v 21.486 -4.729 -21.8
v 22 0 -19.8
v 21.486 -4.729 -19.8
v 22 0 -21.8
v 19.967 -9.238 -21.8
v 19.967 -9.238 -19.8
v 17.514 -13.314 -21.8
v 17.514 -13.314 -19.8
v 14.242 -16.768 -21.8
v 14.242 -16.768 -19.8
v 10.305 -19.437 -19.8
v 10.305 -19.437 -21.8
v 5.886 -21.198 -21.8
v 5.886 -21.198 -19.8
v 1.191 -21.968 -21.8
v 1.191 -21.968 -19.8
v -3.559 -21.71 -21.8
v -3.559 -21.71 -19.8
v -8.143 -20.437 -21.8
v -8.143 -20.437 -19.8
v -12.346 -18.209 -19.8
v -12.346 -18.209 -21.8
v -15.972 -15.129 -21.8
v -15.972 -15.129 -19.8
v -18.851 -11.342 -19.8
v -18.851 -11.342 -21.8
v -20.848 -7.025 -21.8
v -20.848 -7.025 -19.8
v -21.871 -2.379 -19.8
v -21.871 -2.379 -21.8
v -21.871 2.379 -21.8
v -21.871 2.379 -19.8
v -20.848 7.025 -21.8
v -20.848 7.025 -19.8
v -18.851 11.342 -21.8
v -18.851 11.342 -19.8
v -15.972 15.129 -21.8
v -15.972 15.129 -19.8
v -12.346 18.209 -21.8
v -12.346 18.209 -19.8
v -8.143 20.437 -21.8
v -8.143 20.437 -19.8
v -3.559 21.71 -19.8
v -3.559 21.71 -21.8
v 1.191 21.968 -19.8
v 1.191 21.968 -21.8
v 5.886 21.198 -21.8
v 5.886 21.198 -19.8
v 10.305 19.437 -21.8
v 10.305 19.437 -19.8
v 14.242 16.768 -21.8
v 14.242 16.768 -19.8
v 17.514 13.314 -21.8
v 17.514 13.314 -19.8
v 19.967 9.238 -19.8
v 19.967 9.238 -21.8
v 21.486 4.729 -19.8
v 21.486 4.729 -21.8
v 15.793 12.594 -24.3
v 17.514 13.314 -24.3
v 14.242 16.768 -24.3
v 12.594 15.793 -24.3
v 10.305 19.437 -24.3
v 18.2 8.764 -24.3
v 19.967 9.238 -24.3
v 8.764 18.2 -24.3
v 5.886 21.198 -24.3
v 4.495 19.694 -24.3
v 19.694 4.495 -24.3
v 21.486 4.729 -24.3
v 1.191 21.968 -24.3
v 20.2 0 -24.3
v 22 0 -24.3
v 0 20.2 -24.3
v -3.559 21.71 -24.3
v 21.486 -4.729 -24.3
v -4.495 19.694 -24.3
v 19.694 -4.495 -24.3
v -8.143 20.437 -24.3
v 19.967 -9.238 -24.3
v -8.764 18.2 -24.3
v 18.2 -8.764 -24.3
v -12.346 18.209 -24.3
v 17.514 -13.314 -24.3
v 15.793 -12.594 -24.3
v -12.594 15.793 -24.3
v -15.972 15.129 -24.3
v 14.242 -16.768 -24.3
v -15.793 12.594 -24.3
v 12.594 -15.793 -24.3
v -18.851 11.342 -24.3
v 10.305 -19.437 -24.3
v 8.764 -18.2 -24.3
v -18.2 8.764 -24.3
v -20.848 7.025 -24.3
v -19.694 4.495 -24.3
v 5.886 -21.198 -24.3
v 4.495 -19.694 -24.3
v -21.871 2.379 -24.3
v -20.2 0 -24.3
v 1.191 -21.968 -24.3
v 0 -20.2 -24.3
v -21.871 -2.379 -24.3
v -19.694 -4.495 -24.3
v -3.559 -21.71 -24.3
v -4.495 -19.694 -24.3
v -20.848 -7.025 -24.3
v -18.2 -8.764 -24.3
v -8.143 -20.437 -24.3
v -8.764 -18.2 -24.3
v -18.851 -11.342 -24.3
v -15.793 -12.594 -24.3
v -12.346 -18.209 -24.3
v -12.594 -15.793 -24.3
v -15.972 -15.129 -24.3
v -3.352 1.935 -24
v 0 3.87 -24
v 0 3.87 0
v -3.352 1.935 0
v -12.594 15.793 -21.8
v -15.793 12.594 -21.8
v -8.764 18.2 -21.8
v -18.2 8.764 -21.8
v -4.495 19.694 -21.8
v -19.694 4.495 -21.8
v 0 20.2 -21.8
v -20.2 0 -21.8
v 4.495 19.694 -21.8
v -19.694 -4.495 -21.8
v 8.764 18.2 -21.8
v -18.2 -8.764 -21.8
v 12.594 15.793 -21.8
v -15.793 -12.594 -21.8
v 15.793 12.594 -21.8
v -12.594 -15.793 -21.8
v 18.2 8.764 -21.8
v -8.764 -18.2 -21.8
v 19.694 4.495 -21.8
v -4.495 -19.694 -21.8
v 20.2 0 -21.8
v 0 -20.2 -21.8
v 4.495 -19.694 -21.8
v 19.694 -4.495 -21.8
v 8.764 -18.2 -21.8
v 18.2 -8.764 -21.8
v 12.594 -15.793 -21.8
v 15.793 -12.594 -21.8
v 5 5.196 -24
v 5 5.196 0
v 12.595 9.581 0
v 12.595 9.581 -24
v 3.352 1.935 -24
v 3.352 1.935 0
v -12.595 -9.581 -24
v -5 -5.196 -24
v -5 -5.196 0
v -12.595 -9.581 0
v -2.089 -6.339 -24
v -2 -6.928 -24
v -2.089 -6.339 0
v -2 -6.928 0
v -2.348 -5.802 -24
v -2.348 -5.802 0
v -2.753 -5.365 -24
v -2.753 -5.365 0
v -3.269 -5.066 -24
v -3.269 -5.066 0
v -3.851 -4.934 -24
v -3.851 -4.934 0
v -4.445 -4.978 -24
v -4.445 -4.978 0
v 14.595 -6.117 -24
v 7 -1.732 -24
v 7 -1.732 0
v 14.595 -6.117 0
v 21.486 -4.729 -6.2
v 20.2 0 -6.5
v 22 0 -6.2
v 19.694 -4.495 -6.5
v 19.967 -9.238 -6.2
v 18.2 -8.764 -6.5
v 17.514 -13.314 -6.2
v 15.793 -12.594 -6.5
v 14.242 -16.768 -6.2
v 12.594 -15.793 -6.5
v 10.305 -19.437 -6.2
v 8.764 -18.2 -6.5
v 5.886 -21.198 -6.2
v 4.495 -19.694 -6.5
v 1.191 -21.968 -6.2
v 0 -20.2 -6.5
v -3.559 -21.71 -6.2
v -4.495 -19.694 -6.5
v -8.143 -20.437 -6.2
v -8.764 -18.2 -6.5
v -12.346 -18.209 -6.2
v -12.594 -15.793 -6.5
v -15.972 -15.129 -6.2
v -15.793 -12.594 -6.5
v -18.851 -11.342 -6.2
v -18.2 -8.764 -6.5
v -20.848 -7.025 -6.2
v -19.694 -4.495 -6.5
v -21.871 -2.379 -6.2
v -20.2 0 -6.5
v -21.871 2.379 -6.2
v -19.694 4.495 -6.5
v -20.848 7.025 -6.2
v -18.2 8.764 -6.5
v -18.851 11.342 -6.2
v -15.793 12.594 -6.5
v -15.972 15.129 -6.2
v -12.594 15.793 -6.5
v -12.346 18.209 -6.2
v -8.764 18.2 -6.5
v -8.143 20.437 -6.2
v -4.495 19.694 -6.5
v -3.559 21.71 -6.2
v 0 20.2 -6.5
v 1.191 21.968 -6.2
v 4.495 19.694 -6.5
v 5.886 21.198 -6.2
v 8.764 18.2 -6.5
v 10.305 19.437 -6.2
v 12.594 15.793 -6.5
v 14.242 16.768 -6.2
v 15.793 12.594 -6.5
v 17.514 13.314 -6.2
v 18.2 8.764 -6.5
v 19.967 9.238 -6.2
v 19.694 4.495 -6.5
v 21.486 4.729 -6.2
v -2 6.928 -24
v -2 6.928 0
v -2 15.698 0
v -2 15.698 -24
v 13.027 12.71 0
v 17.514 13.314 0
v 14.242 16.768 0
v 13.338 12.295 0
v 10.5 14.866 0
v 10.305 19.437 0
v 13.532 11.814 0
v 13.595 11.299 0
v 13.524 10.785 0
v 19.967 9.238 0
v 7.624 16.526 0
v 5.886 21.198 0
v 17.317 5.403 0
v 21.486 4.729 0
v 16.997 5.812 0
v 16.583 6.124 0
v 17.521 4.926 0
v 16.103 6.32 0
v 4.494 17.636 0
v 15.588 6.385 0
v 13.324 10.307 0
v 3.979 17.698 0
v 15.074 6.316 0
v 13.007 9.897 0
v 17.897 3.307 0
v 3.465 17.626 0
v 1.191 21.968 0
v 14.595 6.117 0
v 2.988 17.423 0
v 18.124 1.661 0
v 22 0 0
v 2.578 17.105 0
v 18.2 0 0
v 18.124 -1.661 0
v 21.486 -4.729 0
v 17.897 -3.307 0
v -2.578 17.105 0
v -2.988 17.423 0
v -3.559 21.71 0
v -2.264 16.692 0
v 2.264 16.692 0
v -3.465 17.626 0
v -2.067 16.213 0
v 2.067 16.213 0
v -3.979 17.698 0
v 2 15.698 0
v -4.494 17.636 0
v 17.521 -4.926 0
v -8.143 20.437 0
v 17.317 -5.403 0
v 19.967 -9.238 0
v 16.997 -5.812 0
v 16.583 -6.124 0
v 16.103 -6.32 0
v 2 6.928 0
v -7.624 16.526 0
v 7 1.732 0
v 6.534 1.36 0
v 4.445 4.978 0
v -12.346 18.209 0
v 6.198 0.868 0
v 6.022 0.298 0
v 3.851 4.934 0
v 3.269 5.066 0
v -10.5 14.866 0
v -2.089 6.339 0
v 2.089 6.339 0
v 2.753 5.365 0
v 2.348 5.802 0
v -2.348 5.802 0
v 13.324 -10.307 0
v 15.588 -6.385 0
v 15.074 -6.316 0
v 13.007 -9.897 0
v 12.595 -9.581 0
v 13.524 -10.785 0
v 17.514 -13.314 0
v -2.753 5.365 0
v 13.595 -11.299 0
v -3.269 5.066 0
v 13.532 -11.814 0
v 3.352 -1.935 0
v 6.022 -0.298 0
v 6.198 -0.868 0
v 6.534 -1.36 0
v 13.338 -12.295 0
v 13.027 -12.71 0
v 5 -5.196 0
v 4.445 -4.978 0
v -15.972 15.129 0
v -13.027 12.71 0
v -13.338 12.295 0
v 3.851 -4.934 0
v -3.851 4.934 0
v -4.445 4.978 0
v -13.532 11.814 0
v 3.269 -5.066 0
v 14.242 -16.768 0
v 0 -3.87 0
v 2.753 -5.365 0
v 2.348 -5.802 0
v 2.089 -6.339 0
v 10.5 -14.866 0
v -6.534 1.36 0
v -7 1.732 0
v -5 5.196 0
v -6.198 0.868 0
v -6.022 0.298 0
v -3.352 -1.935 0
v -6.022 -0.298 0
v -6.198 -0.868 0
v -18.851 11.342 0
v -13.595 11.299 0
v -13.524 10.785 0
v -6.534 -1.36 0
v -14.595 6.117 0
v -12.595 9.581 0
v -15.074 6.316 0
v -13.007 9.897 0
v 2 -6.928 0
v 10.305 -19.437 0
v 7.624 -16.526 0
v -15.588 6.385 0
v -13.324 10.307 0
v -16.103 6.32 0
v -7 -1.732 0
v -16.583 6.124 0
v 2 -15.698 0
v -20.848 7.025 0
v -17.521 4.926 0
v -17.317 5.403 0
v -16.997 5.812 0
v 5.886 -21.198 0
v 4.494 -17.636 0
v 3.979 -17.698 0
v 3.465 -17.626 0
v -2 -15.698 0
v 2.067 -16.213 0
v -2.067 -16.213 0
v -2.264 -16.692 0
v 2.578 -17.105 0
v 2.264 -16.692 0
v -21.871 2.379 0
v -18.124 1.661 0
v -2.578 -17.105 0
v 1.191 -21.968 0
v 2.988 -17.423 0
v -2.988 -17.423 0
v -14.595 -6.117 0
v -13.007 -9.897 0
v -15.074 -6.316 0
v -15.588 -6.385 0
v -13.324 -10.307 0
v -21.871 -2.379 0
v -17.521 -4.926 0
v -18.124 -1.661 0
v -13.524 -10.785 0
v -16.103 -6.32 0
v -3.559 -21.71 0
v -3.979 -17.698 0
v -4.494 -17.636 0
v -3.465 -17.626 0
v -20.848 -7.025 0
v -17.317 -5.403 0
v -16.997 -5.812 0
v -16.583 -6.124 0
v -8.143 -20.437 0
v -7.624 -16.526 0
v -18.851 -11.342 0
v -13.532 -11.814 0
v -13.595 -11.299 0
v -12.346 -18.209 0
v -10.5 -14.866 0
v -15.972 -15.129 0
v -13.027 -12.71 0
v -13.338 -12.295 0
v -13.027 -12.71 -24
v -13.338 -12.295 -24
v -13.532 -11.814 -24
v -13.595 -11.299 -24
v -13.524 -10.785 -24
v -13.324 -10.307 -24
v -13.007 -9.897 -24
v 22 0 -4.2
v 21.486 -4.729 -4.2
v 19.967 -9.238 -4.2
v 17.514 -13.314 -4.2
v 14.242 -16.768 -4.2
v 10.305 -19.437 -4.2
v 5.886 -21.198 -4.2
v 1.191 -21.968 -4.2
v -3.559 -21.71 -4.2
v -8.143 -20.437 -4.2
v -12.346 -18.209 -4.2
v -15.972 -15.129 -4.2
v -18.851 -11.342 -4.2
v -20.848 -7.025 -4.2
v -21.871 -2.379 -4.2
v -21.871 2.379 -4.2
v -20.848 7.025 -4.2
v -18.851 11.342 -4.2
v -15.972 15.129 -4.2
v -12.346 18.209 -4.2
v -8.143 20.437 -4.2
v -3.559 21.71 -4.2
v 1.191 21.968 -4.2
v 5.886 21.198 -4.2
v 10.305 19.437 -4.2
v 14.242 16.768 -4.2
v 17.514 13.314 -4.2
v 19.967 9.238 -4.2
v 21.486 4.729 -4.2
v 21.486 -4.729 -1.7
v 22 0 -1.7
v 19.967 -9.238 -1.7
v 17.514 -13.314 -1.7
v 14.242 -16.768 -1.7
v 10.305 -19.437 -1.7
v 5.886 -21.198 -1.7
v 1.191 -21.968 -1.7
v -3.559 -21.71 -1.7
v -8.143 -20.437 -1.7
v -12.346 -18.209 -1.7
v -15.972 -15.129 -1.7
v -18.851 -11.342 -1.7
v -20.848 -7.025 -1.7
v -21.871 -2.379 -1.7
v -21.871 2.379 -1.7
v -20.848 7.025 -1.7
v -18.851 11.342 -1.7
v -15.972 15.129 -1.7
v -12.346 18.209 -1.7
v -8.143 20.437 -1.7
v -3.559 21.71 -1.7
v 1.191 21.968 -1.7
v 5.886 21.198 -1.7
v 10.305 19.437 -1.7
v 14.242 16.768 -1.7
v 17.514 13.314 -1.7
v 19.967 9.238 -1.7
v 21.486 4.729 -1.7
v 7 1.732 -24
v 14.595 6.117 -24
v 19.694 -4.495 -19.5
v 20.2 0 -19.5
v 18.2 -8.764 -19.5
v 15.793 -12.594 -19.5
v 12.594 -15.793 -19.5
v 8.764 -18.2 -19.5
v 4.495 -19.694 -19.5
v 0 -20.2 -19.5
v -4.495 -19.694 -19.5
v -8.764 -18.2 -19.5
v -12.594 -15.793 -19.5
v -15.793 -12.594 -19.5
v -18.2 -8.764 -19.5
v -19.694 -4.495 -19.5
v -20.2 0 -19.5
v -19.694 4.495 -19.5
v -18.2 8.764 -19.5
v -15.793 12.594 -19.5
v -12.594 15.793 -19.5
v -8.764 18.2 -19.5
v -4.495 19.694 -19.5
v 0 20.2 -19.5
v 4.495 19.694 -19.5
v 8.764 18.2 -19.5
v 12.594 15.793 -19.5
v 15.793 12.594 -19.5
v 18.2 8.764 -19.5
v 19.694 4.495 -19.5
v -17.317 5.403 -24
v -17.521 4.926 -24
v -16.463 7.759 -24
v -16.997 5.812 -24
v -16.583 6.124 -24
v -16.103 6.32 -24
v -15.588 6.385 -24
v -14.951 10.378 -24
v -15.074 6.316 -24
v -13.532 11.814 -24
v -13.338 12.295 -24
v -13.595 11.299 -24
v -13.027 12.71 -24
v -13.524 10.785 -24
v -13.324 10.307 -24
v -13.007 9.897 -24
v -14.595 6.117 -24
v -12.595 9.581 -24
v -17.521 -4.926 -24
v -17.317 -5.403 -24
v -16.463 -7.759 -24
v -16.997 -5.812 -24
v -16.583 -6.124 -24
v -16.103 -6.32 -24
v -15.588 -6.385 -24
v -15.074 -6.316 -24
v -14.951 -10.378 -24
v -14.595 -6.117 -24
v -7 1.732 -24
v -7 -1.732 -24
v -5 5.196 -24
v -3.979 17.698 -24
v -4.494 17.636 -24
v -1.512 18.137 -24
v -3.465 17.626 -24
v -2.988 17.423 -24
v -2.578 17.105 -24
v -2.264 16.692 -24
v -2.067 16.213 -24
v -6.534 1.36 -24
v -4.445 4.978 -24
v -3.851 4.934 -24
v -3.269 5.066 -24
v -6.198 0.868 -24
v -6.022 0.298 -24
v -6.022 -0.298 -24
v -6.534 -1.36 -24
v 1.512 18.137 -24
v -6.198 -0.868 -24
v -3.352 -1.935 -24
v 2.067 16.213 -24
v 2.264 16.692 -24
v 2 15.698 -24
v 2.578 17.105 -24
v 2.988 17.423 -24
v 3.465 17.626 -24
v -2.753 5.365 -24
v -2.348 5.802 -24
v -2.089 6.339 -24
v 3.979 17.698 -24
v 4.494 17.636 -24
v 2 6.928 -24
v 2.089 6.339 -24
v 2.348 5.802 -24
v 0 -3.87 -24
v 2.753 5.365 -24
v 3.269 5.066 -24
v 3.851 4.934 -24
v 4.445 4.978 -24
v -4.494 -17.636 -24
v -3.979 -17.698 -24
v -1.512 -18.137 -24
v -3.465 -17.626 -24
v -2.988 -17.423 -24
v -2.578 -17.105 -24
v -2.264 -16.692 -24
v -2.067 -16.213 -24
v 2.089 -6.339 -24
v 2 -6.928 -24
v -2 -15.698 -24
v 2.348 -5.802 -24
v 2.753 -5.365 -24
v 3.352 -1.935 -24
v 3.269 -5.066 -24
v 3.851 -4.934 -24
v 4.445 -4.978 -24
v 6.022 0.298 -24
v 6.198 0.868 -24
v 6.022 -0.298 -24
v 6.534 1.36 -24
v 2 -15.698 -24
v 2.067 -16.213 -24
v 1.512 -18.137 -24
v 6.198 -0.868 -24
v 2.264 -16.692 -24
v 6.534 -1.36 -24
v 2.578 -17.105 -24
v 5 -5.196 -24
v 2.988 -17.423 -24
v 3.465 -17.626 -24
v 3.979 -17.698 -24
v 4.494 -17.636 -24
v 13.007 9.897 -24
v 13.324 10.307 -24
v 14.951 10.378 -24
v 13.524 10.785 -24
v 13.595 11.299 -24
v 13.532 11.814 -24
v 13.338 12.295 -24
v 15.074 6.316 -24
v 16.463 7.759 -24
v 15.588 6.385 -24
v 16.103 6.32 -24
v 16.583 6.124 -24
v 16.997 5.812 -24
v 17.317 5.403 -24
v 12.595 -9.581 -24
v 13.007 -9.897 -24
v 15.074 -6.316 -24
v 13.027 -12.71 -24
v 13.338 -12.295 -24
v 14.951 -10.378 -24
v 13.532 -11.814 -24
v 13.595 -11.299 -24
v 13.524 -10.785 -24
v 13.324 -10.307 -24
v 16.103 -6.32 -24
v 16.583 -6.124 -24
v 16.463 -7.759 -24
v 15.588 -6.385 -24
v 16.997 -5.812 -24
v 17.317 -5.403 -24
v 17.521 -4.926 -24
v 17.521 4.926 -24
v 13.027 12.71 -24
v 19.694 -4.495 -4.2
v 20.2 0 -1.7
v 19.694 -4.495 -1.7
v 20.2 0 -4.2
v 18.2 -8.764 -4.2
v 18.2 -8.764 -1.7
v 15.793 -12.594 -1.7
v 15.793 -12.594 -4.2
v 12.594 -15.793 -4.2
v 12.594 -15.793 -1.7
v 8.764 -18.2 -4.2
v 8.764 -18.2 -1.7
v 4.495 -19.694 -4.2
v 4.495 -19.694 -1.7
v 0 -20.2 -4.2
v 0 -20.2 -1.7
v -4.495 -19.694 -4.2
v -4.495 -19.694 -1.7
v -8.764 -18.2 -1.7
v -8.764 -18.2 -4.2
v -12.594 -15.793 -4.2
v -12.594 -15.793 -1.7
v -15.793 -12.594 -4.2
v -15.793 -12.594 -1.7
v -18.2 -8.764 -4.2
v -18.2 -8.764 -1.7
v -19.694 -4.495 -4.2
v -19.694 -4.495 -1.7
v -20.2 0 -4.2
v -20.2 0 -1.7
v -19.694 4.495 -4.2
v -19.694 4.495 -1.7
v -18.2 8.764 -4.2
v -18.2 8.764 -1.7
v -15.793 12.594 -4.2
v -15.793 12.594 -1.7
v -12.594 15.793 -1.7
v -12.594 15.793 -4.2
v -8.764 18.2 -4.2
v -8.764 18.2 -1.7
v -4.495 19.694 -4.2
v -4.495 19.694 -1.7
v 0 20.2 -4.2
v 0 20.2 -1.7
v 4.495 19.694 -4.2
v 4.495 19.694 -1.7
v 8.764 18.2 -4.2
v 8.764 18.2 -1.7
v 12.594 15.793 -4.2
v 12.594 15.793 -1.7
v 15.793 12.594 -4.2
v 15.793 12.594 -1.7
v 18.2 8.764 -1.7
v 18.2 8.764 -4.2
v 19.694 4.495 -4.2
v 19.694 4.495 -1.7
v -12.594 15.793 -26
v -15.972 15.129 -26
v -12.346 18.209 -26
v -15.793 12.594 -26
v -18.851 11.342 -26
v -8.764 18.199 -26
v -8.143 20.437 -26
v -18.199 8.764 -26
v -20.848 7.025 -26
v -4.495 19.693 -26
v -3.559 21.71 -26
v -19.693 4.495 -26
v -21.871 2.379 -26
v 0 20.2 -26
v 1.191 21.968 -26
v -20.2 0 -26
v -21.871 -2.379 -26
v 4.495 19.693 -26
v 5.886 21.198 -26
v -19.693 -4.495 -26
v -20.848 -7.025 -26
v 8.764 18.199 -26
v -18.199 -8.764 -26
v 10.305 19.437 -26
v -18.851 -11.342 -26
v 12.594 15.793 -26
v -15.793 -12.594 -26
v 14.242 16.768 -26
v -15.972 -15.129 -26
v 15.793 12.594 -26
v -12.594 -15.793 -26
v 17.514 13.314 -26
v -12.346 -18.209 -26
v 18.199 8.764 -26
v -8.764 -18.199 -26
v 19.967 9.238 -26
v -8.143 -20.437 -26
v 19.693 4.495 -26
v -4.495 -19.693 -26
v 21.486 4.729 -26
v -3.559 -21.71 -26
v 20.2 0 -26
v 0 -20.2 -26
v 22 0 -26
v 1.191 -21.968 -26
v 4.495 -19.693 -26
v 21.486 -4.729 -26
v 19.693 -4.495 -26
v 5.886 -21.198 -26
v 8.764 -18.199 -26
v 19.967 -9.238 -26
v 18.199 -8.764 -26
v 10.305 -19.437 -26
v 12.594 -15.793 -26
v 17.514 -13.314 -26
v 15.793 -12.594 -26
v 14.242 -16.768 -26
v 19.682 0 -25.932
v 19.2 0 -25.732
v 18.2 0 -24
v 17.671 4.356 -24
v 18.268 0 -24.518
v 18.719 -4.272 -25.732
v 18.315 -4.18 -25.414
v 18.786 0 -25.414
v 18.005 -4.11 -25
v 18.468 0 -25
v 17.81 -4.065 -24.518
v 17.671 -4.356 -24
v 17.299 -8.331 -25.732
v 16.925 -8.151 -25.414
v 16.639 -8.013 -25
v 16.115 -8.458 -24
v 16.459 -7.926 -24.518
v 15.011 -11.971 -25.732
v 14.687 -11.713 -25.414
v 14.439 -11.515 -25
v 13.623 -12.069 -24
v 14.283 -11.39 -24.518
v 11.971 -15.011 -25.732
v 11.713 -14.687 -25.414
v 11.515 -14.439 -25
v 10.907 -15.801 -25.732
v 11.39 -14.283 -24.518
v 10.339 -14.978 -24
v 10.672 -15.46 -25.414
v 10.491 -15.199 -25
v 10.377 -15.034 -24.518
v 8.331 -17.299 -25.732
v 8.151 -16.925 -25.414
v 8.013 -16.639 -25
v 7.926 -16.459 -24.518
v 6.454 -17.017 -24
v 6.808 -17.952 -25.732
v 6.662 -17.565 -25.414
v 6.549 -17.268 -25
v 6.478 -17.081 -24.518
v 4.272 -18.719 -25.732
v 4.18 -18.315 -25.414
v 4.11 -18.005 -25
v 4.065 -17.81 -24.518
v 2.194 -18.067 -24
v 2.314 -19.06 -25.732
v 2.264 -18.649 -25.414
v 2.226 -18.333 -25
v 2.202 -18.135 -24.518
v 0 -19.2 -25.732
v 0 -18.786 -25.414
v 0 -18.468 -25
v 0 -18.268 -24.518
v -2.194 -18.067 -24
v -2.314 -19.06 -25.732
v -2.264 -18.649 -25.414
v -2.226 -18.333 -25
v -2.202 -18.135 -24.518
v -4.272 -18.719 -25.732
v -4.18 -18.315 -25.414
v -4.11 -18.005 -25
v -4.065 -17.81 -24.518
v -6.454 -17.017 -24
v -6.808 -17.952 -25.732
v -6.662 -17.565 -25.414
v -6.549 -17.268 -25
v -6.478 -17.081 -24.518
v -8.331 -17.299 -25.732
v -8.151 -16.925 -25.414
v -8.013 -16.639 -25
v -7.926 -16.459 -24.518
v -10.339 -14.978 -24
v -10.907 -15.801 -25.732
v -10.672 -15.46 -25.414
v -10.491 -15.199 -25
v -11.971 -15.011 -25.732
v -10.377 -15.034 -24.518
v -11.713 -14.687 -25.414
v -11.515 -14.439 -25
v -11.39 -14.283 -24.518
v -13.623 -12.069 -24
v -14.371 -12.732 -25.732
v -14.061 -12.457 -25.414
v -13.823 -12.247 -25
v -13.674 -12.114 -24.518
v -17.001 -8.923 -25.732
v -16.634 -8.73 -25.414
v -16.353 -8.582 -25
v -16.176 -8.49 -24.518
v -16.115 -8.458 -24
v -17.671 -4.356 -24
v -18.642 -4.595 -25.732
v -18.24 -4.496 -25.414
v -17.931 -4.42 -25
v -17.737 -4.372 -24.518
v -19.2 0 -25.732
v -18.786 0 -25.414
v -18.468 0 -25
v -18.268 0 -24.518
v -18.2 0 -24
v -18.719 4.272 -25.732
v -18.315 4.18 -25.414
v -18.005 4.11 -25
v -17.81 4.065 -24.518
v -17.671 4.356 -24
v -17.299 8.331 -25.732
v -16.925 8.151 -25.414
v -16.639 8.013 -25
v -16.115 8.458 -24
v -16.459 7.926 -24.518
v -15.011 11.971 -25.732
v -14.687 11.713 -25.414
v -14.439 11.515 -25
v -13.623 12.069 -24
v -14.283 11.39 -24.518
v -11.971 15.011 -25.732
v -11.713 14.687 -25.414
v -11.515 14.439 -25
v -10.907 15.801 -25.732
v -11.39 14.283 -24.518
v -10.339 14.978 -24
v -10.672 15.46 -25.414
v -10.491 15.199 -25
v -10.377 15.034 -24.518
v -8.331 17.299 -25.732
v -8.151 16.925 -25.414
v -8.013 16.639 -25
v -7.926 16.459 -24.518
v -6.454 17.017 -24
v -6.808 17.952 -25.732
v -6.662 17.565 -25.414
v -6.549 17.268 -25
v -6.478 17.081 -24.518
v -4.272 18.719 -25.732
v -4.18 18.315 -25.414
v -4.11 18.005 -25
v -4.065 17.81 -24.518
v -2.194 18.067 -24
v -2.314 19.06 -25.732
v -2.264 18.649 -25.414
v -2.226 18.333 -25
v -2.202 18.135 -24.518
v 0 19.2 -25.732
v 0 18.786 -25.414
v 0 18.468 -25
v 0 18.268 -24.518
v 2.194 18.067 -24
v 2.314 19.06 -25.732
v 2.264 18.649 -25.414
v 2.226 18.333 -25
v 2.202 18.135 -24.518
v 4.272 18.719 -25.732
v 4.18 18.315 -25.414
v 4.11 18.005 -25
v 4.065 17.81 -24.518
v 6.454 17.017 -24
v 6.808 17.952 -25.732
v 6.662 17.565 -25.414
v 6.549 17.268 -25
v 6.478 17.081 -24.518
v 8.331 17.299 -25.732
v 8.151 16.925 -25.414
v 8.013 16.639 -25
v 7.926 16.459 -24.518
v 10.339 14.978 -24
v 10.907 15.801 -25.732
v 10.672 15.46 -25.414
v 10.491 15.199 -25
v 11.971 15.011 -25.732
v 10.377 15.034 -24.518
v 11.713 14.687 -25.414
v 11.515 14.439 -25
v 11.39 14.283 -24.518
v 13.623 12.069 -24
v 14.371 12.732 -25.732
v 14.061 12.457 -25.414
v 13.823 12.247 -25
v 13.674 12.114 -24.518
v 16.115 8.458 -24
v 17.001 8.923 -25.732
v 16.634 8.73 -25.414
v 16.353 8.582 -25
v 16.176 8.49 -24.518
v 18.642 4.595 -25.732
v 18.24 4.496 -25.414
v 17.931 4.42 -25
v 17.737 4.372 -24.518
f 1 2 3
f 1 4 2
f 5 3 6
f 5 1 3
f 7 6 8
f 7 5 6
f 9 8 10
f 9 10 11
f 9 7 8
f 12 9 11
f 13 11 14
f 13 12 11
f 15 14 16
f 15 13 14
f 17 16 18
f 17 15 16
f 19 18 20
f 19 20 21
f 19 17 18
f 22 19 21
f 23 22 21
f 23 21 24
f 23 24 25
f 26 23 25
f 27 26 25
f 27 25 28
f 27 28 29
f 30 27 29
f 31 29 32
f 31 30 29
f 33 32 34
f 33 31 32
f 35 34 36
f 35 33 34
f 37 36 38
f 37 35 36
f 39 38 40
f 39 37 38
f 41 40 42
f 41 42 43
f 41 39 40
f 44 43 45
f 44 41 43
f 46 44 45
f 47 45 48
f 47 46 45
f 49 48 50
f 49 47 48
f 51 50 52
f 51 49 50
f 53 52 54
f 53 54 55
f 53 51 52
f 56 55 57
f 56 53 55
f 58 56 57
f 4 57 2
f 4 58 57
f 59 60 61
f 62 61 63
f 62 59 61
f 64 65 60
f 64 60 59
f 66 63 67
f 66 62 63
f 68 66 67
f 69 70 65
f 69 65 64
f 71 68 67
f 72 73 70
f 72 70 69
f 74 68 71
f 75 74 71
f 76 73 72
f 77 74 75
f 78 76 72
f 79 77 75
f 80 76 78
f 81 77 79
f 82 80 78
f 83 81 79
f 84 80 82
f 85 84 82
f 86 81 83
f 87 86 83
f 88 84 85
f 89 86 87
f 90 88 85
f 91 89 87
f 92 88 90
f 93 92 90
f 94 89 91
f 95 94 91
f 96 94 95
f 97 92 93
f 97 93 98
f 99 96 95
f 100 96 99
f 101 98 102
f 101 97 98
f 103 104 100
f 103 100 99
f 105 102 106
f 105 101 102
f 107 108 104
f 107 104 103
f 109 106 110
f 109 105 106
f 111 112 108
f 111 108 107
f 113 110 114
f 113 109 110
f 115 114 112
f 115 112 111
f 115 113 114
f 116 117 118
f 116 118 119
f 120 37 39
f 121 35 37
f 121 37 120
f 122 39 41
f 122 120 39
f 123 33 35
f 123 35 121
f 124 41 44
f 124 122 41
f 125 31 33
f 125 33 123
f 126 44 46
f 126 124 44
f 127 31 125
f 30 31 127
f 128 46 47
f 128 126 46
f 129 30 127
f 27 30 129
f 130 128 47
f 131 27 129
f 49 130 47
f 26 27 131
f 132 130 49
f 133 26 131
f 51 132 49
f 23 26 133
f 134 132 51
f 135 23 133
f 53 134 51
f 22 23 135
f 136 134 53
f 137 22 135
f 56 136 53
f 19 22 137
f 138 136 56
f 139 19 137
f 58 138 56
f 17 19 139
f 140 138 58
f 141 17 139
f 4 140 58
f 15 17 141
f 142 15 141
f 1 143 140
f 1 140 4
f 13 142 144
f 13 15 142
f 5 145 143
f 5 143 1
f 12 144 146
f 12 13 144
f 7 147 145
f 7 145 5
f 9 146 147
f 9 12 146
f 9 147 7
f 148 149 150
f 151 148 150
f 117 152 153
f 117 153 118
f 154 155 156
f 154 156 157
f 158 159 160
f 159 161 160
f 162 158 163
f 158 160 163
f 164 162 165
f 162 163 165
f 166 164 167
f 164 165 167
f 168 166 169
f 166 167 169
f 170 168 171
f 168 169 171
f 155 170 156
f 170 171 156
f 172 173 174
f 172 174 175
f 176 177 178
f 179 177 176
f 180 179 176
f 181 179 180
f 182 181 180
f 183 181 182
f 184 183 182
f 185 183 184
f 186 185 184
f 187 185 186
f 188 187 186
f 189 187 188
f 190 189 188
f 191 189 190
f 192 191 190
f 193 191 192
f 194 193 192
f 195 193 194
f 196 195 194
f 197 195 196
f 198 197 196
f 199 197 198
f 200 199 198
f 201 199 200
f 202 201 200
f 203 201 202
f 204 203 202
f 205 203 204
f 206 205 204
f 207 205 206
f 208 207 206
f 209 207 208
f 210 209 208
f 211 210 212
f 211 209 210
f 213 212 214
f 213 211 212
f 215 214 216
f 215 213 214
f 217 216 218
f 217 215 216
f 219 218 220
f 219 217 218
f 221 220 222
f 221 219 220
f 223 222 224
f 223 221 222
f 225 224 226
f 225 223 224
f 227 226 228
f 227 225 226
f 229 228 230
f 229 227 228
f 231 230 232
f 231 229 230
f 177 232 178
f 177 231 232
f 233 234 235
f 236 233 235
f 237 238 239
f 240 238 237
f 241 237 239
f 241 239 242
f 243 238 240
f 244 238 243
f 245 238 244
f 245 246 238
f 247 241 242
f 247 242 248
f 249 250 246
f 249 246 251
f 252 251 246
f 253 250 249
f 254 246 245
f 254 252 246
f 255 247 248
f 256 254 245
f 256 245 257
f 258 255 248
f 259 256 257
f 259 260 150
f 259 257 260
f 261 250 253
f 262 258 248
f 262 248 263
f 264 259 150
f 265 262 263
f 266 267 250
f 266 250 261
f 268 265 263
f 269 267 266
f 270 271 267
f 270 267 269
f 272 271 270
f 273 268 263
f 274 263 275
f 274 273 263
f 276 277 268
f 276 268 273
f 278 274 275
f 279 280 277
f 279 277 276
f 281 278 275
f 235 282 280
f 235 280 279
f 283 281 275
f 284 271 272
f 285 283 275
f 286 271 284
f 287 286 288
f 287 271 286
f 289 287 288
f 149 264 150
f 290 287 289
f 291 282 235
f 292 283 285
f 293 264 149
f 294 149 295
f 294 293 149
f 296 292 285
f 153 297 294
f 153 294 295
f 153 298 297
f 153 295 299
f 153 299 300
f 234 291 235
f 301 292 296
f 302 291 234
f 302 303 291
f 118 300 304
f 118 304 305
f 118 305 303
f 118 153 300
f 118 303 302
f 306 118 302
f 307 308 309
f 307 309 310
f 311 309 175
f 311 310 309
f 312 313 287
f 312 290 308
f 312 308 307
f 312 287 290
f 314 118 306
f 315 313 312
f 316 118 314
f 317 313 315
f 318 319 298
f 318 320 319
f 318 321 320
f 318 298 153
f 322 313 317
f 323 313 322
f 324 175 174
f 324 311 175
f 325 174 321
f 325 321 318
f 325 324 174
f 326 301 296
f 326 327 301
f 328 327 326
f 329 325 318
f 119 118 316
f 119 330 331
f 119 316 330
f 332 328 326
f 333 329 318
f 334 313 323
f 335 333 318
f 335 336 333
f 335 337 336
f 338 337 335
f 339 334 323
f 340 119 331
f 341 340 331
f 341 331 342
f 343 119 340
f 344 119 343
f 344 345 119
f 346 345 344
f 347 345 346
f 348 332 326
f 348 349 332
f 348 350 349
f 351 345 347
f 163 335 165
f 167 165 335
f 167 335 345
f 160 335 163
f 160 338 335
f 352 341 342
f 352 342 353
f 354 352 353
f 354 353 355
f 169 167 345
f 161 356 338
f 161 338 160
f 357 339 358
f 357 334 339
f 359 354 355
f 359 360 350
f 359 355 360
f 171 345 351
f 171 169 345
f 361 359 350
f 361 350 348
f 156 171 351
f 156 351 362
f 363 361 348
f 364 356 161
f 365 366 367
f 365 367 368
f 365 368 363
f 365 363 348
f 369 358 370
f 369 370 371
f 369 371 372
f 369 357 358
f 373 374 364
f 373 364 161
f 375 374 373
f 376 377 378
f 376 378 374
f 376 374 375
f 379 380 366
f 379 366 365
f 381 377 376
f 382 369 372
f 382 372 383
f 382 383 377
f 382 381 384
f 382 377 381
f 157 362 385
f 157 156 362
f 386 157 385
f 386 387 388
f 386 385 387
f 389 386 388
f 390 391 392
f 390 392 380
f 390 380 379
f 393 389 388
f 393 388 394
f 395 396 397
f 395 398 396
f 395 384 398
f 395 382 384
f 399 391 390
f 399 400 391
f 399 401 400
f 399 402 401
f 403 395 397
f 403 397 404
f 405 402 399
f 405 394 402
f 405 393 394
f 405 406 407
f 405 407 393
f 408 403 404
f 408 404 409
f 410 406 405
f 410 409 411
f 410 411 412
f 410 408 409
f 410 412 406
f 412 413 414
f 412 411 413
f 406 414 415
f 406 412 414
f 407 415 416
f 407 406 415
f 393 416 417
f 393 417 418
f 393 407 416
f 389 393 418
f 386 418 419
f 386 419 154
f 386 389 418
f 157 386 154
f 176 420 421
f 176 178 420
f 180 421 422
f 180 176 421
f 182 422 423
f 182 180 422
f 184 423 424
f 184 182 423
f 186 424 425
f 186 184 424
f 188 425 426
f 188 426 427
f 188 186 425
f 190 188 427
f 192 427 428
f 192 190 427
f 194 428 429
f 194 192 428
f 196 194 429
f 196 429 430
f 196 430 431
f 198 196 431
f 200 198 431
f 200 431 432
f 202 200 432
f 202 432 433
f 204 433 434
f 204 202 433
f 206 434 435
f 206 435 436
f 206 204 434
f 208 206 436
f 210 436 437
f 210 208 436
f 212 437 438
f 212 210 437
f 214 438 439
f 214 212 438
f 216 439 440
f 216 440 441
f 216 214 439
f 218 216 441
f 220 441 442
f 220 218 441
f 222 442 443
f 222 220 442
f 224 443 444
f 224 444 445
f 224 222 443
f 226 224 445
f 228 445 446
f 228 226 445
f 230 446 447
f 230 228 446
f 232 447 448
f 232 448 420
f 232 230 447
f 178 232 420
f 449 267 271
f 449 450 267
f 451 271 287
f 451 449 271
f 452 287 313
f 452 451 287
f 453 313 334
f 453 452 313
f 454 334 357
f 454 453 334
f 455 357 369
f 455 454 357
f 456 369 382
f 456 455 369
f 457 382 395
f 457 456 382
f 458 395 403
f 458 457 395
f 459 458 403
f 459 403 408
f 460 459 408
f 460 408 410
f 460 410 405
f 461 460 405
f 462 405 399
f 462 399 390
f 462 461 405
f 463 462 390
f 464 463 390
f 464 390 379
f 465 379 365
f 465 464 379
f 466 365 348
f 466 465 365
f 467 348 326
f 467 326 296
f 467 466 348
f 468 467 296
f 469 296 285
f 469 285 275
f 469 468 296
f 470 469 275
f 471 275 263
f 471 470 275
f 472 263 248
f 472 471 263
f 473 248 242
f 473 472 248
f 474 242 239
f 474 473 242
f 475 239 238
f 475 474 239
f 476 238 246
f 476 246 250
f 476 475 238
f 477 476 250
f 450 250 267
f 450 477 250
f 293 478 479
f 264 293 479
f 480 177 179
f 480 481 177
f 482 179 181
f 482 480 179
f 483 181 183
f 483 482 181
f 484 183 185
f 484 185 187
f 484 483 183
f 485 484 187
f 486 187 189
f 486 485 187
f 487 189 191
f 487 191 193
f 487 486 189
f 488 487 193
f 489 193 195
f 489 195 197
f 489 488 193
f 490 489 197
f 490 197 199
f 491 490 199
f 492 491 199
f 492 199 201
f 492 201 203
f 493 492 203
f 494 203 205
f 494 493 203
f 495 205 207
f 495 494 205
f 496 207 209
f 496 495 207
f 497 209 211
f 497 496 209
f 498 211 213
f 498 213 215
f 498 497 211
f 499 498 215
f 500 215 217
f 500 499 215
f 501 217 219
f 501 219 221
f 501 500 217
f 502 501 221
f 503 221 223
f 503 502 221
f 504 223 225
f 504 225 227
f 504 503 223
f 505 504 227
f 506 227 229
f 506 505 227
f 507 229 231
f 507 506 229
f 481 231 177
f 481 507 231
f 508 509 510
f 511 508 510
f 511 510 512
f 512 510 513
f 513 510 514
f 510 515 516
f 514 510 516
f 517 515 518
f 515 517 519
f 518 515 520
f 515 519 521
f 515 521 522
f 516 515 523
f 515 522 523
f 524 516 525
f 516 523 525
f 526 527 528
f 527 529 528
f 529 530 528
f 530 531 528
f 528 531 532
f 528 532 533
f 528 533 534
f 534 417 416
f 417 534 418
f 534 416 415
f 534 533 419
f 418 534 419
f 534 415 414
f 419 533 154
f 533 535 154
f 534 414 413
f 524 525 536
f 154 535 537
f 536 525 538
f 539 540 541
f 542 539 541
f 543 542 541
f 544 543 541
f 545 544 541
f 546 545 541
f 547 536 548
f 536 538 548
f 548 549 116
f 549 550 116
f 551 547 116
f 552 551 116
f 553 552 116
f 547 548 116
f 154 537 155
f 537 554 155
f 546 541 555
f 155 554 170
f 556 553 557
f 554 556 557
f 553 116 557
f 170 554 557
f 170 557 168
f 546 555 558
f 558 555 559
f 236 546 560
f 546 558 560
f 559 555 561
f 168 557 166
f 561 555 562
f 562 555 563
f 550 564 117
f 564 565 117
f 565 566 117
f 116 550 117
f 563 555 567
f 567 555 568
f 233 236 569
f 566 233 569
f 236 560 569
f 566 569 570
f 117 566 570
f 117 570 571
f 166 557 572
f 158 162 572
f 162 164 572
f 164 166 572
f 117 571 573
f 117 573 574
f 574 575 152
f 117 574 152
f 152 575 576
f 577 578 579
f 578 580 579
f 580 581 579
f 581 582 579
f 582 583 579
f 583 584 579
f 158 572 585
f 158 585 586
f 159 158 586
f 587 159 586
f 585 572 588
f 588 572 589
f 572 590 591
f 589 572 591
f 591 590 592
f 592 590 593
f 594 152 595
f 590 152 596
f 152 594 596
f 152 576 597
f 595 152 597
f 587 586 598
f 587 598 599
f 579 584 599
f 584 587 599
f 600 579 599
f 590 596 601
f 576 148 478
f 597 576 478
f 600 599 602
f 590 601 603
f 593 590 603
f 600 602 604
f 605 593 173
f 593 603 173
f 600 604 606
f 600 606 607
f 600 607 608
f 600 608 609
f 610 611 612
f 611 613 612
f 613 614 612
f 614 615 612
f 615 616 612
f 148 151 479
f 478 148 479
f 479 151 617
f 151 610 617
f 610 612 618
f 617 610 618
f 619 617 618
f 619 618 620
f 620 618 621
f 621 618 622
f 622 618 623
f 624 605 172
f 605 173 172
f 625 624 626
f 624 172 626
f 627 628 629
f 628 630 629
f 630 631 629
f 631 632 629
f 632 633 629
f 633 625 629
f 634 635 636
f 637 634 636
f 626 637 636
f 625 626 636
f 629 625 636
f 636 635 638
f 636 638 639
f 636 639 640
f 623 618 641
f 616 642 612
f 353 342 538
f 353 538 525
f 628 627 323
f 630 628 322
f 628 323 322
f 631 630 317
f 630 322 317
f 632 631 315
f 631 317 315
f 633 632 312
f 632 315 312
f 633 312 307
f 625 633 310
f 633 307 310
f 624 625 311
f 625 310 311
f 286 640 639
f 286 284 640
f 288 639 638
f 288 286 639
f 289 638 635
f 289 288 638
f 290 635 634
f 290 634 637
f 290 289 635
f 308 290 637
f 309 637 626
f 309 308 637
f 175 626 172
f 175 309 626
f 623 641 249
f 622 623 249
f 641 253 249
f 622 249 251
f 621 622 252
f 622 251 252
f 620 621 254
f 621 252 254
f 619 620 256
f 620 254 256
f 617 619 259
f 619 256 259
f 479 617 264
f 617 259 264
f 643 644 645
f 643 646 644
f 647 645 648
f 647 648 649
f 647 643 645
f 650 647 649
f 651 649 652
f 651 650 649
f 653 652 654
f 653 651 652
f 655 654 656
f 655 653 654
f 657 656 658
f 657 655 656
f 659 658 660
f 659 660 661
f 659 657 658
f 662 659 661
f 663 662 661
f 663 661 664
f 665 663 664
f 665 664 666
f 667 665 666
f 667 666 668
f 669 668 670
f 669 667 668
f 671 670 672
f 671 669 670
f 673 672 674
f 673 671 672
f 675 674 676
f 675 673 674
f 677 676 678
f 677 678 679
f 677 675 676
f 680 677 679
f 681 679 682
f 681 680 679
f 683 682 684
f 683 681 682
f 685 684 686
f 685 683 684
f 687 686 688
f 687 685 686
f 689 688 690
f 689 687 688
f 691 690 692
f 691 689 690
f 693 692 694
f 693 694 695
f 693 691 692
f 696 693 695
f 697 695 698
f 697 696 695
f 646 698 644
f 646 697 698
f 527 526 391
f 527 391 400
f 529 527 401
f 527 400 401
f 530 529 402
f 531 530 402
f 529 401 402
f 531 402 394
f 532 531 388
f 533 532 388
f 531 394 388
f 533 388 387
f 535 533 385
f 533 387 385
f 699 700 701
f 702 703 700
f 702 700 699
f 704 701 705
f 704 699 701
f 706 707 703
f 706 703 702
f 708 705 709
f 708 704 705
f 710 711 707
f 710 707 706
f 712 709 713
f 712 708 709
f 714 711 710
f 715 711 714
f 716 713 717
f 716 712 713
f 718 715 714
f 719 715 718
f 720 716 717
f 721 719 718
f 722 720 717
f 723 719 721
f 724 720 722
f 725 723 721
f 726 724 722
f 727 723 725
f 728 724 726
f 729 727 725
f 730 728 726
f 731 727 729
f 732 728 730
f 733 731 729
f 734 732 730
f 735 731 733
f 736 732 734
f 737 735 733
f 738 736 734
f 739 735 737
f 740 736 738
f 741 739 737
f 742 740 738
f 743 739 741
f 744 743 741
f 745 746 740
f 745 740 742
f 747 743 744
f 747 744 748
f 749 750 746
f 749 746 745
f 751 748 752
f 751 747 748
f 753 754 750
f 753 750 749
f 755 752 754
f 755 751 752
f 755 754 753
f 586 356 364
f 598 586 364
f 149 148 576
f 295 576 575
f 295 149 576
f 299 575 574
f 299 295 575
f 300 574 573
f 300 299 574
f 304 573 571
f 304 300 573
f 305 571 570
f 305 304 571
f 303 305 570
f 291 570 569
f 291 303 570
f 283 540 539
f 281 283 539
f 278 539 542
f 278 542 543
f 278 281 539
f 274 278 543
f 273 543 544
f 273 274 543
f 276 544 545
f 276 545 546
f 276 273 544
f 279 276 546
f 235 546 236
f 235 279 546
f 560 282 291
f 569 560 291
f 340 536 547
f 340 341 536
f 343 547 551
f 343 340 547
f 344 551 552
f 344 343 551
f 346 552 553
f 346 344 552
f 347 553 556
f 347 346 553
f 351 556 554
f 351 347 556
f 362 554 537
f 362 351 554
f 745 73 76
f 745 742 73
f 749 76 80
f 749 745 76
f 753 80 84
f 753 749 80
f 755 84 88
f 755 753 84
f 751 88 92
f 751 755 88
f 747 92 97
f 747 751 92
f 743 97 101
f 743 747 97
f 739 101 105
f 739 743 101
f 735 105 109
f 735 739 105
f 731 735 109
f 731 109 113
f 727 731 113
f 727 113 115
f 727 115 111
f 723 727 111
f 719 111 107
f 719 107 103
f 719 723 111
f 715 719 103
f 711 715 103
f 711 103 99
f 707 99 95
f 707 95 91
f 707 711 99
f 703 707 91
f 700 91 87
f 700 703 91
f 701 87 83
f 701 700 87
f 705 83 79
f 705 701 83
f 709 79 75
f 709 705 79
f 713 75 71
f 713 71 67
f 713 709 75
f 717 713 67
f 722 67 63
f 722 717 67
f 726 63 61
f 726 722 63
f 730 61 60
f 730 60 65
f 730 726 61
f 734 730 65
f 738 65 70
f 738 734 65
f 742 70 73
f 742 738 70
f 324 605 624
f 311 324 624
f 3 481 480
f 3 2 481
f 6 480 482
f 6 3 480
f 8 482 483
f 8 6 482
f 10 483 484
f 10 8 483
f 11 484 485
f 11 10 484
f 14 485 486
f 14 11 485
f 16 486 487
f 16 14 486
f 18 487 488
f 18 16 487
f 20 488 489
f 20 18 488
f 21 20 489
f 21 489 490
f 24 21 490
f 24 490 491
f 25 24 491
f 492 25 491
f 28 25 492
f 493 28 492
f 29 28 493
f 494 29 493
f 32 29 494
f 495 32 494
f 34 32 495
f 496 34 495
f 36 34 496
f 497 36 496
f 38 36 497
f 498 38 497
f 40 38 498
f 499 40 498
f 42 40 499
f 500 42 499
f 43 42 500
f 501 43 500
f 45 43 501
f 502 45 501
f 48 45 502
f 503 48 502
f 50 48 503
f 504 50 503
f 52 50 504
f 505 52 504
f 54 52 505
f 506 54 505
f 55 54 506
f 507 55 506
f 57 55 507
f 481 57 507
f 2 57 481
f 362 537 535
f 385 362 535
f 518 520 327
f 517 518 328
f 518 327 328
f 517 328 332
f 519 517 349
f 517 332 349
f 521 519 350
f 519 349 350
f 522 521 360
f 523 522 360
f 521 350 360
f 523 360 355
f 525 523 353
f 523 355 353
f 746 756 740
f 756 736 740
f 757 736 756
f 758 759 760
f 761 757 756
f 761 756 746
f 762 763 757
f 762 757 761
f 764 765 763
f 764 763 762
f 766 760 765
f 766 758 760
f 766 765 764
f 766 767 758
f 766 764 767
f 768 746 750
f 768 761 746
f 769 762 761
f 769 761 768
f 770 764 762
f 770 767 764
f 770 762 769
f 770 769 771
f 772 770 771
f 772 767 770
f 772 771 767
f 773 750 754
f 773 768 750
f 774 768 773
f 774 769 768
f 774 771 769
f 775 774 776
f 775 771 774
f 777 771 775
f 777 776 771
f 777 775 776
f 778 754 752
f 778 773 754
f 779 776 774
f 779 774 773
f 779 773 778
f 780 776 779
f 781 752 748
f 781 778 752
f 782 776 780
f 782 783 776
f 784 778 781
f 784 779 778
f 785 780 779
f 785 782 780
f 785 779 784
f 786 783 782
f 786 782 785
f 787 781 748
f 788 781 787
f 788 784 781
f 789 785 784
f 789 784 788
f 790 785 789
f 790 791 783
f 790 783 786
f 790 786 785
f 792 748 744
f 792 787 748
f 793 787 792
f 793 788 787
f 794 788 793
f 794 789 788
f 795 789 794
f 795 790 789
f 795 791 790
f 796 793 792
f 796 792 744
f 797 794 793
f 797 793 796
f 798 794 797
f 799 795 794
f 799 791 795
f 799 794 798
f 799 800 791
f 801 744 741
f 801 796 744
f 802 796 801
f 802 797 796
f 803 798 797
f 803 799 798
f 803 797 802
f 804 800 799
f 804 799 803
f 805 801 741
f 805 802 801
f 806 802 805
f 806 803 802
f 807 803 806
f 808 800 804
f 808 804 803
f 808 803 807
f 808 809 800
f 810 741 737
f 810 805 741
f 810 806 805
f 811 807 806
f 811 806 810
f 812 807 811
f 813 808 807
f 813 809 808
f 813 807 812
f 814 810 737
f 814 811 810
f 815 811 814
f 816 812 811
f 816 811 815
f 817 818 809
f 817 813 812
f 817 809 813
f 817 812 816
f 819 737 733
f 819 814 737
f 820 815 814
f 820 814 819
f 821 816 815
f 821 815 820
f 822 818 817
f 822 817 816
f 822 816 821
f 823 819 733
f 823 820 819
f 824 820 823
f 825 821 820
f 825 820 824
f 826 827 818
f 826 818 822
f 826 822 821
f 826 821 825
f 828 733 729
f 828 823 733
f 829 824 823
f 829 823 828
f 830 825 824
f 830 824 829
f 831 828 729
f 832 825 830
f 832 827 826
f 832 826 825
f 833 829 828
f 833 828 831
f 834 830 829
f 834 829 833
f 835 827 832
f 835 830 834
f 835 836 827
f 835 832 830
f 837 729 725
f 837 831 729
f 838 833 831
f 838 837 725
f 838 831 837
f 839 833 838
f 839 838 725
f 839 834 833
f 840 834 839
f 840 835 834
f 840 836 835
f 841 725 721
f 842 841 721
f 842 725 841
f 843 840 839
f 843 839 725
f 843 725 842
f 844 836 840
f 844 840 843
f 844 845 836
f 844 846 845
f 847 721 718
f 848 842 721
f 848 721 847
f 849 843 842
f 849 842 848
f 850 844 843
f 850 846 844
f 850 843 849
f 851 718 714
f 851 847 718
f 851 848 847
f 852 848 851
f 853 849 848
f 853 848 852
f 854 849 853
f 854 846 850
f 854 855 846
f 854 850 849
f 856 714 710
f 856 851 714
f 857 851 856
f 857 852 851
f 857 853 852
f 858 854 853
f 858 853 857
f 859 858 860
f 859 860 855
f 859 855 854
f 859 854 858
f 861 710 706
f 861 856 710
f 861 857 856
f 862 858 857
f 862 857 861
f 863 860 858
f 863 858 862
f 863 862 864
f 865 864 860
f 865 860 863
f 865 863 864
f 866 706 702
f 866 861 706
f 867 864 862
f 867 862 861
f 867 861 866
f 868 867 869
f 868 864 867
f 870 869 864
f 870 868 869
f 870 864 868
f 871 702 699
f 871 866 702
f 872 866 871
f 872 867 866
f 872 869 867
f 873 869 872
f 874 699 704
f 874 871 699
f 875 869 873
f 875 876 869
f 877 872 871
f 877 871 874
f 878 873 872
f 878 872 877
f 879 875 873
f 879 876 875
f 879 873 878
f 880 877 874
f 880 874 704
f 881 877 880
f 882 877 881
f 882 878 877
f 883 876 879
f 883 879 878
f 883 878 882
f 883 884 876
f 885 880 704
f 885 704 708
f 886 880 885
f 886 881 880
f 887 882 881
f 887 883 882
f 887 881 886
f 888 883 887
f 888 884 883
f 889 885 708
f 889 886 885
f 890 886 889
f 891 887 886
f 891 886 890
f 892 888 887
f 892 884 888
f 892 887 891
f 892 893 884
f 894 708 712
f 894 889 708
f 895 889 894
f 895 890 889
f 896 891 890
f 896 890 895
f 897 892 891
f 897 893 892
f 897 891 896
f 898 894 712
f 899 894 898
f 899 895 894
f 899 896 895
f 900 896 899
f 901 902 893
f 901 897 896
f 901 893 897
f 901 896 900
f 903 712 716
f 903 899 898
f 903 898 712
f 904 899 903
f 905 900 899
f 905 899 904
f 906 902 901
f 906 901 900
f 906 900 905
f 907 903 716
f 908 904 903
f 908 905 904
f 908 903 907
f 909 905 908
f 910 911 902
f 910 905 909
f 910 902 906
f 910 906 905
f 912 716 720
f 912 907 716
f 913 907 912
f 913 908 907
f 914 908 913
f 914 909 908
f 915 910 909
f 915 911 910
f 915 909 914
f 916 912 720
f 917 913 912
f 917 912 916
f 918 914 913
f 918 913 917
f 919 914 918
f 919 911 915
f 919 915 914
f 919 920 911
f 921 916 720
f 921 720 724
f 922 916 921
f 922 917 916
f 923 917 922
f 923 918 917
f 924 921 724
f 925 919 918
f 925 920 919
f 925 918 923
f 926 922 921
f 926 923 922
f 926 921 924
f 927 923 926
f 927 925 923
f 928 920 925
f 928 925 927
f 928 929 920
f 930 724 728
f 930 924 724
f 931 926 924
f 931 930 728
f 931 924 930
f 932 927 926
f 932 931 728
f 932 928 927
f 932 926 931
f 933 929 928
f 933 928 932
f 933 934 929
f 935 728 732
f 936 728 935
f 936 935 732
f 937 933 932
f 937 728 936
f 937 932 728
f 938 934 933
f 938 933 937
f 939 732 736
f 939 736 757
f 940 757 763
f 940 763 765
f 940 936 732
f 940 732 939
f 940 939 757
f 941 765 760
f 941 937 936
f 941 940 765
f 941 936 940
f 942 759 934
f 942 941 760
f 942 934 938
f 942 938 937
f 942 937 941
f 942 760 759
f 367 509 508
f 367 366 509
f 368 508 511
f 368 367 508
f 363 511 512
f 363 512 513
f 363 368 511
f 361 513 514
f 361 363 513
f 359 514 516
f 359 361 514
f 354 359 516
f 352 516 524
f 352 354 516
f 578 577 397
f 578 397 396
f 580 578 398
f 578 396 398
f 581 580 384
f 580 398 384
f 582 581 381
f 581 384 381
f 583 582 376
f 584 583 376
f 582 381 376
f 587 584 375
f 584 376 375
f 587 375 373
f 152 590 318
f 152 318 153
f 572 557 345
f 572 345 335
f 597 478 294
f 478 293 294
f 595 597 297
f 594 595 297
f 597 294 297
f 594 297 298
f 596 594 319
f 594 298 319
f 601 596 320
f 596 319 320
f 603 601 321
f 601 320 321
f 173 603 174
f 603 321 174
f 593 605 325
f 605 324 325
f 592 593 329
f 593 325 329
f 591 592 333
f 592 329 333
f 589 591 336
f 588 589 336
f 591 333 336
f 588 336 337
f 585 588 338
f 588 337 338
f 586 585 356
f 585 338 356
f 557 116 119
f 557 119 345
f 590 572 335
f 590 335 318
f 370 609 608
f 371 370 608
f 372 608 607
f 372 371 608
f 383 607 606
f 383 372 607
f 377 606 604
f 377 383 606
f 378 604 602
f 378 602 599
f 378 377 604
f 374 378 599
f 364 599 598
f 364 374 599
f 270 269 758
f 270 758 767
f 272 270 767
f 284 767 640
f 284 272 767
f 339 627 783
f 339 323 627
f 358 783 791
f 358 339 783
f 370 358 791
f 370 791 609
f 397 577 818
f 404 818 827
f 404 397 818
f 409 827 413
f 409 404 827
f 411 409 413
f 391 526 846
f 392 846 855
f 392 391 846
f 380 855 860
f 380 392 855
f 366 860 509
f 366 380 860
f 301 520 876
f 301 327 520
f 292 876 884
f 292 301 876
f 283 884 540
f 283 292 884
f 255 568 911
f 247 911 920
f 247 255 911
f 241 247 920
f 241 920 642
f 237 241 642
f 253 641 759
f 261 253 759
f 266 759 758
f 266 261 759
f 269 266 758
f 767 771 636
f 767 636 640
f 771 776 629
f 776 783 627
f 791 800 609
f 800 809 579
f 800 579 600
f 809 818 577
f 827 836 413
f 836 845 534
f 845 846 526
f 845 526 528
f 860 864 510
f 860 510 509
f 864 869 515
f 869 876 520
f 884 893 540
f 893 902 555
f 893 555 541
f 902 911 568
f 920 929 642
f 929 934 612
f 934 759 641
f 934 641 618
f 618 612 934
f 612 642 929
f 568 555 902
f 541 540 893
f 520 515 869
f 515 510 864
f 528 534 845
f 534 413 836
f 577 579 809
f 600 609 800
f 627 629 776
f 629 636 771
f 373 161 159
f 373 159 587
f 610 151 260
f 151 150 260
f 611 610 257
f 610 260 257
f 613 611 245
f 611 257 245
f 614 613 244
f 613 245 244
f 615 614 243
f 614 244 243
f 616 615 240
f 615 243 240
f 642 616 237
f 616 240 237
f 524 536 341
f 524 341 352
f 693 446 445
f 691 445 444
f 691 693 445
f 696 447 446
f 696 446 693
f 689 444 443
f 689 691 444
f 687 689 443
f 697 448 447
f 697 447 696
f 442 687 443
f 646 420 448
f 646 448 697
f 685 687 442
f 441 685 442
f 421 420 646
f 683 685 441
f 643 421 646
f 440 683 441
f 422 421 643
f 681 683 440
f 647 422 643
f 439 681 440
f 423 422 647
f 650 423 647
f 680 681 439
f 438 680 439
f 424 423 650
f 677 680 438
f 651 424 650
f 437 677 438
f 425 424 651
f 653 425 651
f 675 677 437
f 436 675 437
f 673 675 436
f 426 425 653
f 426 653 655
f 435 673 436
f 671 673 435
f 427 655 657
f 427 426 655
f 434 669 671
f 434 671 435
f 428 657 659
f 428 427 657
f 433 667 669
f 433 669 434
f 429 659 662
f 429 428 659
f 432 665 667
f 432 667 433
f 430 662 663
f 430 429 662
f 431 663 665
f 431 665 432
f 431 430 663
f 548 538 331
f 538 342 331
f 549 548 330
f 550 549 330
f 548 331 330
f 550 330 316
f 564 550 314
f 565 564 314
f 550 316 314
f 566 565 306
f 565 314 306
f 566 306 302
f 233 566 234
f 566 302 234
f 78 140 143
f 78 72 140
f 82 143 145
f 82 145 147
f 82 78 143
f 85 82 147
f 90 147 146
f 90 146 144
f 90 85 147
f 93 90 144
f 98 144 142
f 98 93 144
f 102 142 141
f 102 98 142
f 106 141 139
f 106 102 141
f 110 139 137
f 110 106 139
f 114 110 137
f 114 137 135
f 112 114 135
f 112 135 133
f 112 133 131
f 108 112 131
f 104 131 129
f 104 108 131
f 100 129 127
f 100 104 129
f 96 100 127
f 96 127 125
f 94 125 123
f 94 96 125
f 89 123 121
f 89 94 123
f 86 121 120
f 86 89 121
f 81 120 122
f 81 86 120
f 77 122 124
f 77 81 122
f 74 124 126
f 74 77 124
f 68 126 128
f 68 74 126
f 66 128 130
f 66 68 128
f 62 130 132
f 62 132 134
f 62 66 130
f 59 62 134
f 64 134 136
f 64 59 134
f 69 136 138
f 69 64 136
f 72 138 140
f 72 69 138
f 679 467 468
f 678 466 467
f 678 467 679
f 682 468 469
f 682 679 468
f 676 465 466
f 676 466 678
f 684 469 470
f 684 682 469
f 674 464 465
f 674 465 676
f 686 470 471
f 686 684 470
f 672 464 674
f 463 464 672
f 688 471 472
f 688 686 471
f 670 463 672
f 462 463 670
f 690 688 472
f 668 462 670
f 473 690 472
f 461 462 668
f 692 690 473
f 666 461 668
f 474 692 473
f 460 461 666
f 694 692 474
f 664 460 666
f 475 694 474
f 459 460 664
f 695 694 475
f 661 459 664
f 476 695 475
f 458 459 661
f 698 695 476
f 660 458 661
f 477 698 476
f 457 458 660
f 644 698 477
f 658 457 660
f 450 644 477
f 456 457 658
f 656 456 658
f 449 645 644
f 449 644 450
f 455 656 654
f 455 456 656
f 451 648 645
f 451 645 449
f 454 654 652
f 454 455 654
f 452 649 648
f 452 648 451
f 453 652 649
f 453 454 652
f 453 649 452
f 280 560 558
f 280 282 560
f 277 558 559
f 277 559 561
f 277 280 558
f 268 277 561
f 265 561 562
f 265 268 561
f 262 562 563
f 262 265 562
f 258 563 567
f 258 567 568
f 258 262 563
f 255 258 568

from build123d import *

# Parameters (mm, degrees)
SKETCH2_W               = 4
SKETCH2_H               = 18.2
BOSS_EXTRUDE1_DEPTH     = 24
CIRPATTERN1_COUNT       = 6
CUT_EXTRUDE1_DEPTH      = 41.546269865
CUT_EXTRUDE1_DEPTH_BACK = 41.546269865
FILLET1_R               = 2
FILLET2_R               = 2


with BuildPart() as part:
    # Sketch1 → Revolve1 (revolve)
    with BuildSketch(Plane(origin=(0, 0, 0), x_dir=(0, 0, -1), z_dir=(1, 0, 0)), mode=Mode.PRIVATE) as revolve1_sk:
        Polygon((0, 22), (1.7, 22), (1.7, 20.2), (4.2, 20.2), (4.2, 22), (6.2, 22), (6.5, 20.2), (19.5, 20.2), (19.8, 22), (21.8, 22), (21.8, 20.2), (24.3, 20.2), (24.3, 22), (26, 22), (26, 18.2), (0, 18.2), align=None)
    revolve(revolve1_sk.sketch.rotate(Axis((0, 0, 0.322174052), (0, 0, -1)), 90), axis=Axis((0, 0, 0.322174052), (0, 0, -1)))

    # Sketch2 → Boss-Extrude1 (add)
    with BuildSketch(Plane.XY):
        with Locations((0, 9.1)):
            Rectangle(SKETCH2_W, SKETCH2_H)
    boss_extrude1 = extrude(amount=-BOSS_EXTRUDE1_DEPTH)

    # CirPattern1: Boss-Extrude1 ×6 about axis
    cirpattern1_axis = Axis((0, 0, 0), (0, 0, 1))
    for i in range(1, CIRPATTERN1_COUNT):
        add(boss_extrude1.rotate(cirpattern1_axis, i * 360 / CIRPATTERN1_COUNT))

    # Sketch3 → Cut-Extrude1 (cut, two sides: drawn at the far end of the back side and taken through both)
    with BuildSketch(Plane.XY.offset(-CUT_EXTRUDE1_DEPTH_BACK)):
        Polygon((0, -3.87), (3.351518313, -1.935), (3.351518313, 1.935), (0, 3.87), (-3.351518313, 1.935), (-3.351518313, -1.935), align=None)
    extrude(amount=CUT_EXTRUDE1_DEPTH + CUT_EXTRUDE1_DEPTH_BACK, mode=Mode.SUBTRACT)

    # Fillet1
    fillet1_edges = [part.edges().sort_by_distance(p)[0] for p in [
        (14.666205667, 10.776938867, -12),
        (-14.666205667, 10.776938867, -12),
        (-2, 18.089776118, -12),
        (2, 18.089776118, -12),
        (-16.666205667, 7.312837251, -12),
        (-14.666205667, -10.776938867, -12),
        (-16.666205667, -7.312837251, -12),
        (2, -18.089776118, -12),
        (-2, -18.089776118, -12),
        (14.666205667, -10.776938867, -12),
        (16.666205667, -7.312837251, -12),
        (16.666205667, 7.312837251, -12),
        (4, 0, -12),
        (2, -3.464101615, -12),
        (-2, -3.464101615, -12),
        (-4, 0, -12),
        (2, 3.464101615, -12),
        (-2, 3.464101615, -12),
    ]]
    fillet(fillet1_edges, radius=FILLET1_R)

    # Fillet2
    fillet2_edges = [part.edges().sort_by_distance(p)[0] for p in [
        (-18.2, 0, -26),
    ]]
    fillet(fillet2_edges, radius=FILLET2_R - 0.0001)  # a hair under: the kernel refuses the full size


solid = part.part
